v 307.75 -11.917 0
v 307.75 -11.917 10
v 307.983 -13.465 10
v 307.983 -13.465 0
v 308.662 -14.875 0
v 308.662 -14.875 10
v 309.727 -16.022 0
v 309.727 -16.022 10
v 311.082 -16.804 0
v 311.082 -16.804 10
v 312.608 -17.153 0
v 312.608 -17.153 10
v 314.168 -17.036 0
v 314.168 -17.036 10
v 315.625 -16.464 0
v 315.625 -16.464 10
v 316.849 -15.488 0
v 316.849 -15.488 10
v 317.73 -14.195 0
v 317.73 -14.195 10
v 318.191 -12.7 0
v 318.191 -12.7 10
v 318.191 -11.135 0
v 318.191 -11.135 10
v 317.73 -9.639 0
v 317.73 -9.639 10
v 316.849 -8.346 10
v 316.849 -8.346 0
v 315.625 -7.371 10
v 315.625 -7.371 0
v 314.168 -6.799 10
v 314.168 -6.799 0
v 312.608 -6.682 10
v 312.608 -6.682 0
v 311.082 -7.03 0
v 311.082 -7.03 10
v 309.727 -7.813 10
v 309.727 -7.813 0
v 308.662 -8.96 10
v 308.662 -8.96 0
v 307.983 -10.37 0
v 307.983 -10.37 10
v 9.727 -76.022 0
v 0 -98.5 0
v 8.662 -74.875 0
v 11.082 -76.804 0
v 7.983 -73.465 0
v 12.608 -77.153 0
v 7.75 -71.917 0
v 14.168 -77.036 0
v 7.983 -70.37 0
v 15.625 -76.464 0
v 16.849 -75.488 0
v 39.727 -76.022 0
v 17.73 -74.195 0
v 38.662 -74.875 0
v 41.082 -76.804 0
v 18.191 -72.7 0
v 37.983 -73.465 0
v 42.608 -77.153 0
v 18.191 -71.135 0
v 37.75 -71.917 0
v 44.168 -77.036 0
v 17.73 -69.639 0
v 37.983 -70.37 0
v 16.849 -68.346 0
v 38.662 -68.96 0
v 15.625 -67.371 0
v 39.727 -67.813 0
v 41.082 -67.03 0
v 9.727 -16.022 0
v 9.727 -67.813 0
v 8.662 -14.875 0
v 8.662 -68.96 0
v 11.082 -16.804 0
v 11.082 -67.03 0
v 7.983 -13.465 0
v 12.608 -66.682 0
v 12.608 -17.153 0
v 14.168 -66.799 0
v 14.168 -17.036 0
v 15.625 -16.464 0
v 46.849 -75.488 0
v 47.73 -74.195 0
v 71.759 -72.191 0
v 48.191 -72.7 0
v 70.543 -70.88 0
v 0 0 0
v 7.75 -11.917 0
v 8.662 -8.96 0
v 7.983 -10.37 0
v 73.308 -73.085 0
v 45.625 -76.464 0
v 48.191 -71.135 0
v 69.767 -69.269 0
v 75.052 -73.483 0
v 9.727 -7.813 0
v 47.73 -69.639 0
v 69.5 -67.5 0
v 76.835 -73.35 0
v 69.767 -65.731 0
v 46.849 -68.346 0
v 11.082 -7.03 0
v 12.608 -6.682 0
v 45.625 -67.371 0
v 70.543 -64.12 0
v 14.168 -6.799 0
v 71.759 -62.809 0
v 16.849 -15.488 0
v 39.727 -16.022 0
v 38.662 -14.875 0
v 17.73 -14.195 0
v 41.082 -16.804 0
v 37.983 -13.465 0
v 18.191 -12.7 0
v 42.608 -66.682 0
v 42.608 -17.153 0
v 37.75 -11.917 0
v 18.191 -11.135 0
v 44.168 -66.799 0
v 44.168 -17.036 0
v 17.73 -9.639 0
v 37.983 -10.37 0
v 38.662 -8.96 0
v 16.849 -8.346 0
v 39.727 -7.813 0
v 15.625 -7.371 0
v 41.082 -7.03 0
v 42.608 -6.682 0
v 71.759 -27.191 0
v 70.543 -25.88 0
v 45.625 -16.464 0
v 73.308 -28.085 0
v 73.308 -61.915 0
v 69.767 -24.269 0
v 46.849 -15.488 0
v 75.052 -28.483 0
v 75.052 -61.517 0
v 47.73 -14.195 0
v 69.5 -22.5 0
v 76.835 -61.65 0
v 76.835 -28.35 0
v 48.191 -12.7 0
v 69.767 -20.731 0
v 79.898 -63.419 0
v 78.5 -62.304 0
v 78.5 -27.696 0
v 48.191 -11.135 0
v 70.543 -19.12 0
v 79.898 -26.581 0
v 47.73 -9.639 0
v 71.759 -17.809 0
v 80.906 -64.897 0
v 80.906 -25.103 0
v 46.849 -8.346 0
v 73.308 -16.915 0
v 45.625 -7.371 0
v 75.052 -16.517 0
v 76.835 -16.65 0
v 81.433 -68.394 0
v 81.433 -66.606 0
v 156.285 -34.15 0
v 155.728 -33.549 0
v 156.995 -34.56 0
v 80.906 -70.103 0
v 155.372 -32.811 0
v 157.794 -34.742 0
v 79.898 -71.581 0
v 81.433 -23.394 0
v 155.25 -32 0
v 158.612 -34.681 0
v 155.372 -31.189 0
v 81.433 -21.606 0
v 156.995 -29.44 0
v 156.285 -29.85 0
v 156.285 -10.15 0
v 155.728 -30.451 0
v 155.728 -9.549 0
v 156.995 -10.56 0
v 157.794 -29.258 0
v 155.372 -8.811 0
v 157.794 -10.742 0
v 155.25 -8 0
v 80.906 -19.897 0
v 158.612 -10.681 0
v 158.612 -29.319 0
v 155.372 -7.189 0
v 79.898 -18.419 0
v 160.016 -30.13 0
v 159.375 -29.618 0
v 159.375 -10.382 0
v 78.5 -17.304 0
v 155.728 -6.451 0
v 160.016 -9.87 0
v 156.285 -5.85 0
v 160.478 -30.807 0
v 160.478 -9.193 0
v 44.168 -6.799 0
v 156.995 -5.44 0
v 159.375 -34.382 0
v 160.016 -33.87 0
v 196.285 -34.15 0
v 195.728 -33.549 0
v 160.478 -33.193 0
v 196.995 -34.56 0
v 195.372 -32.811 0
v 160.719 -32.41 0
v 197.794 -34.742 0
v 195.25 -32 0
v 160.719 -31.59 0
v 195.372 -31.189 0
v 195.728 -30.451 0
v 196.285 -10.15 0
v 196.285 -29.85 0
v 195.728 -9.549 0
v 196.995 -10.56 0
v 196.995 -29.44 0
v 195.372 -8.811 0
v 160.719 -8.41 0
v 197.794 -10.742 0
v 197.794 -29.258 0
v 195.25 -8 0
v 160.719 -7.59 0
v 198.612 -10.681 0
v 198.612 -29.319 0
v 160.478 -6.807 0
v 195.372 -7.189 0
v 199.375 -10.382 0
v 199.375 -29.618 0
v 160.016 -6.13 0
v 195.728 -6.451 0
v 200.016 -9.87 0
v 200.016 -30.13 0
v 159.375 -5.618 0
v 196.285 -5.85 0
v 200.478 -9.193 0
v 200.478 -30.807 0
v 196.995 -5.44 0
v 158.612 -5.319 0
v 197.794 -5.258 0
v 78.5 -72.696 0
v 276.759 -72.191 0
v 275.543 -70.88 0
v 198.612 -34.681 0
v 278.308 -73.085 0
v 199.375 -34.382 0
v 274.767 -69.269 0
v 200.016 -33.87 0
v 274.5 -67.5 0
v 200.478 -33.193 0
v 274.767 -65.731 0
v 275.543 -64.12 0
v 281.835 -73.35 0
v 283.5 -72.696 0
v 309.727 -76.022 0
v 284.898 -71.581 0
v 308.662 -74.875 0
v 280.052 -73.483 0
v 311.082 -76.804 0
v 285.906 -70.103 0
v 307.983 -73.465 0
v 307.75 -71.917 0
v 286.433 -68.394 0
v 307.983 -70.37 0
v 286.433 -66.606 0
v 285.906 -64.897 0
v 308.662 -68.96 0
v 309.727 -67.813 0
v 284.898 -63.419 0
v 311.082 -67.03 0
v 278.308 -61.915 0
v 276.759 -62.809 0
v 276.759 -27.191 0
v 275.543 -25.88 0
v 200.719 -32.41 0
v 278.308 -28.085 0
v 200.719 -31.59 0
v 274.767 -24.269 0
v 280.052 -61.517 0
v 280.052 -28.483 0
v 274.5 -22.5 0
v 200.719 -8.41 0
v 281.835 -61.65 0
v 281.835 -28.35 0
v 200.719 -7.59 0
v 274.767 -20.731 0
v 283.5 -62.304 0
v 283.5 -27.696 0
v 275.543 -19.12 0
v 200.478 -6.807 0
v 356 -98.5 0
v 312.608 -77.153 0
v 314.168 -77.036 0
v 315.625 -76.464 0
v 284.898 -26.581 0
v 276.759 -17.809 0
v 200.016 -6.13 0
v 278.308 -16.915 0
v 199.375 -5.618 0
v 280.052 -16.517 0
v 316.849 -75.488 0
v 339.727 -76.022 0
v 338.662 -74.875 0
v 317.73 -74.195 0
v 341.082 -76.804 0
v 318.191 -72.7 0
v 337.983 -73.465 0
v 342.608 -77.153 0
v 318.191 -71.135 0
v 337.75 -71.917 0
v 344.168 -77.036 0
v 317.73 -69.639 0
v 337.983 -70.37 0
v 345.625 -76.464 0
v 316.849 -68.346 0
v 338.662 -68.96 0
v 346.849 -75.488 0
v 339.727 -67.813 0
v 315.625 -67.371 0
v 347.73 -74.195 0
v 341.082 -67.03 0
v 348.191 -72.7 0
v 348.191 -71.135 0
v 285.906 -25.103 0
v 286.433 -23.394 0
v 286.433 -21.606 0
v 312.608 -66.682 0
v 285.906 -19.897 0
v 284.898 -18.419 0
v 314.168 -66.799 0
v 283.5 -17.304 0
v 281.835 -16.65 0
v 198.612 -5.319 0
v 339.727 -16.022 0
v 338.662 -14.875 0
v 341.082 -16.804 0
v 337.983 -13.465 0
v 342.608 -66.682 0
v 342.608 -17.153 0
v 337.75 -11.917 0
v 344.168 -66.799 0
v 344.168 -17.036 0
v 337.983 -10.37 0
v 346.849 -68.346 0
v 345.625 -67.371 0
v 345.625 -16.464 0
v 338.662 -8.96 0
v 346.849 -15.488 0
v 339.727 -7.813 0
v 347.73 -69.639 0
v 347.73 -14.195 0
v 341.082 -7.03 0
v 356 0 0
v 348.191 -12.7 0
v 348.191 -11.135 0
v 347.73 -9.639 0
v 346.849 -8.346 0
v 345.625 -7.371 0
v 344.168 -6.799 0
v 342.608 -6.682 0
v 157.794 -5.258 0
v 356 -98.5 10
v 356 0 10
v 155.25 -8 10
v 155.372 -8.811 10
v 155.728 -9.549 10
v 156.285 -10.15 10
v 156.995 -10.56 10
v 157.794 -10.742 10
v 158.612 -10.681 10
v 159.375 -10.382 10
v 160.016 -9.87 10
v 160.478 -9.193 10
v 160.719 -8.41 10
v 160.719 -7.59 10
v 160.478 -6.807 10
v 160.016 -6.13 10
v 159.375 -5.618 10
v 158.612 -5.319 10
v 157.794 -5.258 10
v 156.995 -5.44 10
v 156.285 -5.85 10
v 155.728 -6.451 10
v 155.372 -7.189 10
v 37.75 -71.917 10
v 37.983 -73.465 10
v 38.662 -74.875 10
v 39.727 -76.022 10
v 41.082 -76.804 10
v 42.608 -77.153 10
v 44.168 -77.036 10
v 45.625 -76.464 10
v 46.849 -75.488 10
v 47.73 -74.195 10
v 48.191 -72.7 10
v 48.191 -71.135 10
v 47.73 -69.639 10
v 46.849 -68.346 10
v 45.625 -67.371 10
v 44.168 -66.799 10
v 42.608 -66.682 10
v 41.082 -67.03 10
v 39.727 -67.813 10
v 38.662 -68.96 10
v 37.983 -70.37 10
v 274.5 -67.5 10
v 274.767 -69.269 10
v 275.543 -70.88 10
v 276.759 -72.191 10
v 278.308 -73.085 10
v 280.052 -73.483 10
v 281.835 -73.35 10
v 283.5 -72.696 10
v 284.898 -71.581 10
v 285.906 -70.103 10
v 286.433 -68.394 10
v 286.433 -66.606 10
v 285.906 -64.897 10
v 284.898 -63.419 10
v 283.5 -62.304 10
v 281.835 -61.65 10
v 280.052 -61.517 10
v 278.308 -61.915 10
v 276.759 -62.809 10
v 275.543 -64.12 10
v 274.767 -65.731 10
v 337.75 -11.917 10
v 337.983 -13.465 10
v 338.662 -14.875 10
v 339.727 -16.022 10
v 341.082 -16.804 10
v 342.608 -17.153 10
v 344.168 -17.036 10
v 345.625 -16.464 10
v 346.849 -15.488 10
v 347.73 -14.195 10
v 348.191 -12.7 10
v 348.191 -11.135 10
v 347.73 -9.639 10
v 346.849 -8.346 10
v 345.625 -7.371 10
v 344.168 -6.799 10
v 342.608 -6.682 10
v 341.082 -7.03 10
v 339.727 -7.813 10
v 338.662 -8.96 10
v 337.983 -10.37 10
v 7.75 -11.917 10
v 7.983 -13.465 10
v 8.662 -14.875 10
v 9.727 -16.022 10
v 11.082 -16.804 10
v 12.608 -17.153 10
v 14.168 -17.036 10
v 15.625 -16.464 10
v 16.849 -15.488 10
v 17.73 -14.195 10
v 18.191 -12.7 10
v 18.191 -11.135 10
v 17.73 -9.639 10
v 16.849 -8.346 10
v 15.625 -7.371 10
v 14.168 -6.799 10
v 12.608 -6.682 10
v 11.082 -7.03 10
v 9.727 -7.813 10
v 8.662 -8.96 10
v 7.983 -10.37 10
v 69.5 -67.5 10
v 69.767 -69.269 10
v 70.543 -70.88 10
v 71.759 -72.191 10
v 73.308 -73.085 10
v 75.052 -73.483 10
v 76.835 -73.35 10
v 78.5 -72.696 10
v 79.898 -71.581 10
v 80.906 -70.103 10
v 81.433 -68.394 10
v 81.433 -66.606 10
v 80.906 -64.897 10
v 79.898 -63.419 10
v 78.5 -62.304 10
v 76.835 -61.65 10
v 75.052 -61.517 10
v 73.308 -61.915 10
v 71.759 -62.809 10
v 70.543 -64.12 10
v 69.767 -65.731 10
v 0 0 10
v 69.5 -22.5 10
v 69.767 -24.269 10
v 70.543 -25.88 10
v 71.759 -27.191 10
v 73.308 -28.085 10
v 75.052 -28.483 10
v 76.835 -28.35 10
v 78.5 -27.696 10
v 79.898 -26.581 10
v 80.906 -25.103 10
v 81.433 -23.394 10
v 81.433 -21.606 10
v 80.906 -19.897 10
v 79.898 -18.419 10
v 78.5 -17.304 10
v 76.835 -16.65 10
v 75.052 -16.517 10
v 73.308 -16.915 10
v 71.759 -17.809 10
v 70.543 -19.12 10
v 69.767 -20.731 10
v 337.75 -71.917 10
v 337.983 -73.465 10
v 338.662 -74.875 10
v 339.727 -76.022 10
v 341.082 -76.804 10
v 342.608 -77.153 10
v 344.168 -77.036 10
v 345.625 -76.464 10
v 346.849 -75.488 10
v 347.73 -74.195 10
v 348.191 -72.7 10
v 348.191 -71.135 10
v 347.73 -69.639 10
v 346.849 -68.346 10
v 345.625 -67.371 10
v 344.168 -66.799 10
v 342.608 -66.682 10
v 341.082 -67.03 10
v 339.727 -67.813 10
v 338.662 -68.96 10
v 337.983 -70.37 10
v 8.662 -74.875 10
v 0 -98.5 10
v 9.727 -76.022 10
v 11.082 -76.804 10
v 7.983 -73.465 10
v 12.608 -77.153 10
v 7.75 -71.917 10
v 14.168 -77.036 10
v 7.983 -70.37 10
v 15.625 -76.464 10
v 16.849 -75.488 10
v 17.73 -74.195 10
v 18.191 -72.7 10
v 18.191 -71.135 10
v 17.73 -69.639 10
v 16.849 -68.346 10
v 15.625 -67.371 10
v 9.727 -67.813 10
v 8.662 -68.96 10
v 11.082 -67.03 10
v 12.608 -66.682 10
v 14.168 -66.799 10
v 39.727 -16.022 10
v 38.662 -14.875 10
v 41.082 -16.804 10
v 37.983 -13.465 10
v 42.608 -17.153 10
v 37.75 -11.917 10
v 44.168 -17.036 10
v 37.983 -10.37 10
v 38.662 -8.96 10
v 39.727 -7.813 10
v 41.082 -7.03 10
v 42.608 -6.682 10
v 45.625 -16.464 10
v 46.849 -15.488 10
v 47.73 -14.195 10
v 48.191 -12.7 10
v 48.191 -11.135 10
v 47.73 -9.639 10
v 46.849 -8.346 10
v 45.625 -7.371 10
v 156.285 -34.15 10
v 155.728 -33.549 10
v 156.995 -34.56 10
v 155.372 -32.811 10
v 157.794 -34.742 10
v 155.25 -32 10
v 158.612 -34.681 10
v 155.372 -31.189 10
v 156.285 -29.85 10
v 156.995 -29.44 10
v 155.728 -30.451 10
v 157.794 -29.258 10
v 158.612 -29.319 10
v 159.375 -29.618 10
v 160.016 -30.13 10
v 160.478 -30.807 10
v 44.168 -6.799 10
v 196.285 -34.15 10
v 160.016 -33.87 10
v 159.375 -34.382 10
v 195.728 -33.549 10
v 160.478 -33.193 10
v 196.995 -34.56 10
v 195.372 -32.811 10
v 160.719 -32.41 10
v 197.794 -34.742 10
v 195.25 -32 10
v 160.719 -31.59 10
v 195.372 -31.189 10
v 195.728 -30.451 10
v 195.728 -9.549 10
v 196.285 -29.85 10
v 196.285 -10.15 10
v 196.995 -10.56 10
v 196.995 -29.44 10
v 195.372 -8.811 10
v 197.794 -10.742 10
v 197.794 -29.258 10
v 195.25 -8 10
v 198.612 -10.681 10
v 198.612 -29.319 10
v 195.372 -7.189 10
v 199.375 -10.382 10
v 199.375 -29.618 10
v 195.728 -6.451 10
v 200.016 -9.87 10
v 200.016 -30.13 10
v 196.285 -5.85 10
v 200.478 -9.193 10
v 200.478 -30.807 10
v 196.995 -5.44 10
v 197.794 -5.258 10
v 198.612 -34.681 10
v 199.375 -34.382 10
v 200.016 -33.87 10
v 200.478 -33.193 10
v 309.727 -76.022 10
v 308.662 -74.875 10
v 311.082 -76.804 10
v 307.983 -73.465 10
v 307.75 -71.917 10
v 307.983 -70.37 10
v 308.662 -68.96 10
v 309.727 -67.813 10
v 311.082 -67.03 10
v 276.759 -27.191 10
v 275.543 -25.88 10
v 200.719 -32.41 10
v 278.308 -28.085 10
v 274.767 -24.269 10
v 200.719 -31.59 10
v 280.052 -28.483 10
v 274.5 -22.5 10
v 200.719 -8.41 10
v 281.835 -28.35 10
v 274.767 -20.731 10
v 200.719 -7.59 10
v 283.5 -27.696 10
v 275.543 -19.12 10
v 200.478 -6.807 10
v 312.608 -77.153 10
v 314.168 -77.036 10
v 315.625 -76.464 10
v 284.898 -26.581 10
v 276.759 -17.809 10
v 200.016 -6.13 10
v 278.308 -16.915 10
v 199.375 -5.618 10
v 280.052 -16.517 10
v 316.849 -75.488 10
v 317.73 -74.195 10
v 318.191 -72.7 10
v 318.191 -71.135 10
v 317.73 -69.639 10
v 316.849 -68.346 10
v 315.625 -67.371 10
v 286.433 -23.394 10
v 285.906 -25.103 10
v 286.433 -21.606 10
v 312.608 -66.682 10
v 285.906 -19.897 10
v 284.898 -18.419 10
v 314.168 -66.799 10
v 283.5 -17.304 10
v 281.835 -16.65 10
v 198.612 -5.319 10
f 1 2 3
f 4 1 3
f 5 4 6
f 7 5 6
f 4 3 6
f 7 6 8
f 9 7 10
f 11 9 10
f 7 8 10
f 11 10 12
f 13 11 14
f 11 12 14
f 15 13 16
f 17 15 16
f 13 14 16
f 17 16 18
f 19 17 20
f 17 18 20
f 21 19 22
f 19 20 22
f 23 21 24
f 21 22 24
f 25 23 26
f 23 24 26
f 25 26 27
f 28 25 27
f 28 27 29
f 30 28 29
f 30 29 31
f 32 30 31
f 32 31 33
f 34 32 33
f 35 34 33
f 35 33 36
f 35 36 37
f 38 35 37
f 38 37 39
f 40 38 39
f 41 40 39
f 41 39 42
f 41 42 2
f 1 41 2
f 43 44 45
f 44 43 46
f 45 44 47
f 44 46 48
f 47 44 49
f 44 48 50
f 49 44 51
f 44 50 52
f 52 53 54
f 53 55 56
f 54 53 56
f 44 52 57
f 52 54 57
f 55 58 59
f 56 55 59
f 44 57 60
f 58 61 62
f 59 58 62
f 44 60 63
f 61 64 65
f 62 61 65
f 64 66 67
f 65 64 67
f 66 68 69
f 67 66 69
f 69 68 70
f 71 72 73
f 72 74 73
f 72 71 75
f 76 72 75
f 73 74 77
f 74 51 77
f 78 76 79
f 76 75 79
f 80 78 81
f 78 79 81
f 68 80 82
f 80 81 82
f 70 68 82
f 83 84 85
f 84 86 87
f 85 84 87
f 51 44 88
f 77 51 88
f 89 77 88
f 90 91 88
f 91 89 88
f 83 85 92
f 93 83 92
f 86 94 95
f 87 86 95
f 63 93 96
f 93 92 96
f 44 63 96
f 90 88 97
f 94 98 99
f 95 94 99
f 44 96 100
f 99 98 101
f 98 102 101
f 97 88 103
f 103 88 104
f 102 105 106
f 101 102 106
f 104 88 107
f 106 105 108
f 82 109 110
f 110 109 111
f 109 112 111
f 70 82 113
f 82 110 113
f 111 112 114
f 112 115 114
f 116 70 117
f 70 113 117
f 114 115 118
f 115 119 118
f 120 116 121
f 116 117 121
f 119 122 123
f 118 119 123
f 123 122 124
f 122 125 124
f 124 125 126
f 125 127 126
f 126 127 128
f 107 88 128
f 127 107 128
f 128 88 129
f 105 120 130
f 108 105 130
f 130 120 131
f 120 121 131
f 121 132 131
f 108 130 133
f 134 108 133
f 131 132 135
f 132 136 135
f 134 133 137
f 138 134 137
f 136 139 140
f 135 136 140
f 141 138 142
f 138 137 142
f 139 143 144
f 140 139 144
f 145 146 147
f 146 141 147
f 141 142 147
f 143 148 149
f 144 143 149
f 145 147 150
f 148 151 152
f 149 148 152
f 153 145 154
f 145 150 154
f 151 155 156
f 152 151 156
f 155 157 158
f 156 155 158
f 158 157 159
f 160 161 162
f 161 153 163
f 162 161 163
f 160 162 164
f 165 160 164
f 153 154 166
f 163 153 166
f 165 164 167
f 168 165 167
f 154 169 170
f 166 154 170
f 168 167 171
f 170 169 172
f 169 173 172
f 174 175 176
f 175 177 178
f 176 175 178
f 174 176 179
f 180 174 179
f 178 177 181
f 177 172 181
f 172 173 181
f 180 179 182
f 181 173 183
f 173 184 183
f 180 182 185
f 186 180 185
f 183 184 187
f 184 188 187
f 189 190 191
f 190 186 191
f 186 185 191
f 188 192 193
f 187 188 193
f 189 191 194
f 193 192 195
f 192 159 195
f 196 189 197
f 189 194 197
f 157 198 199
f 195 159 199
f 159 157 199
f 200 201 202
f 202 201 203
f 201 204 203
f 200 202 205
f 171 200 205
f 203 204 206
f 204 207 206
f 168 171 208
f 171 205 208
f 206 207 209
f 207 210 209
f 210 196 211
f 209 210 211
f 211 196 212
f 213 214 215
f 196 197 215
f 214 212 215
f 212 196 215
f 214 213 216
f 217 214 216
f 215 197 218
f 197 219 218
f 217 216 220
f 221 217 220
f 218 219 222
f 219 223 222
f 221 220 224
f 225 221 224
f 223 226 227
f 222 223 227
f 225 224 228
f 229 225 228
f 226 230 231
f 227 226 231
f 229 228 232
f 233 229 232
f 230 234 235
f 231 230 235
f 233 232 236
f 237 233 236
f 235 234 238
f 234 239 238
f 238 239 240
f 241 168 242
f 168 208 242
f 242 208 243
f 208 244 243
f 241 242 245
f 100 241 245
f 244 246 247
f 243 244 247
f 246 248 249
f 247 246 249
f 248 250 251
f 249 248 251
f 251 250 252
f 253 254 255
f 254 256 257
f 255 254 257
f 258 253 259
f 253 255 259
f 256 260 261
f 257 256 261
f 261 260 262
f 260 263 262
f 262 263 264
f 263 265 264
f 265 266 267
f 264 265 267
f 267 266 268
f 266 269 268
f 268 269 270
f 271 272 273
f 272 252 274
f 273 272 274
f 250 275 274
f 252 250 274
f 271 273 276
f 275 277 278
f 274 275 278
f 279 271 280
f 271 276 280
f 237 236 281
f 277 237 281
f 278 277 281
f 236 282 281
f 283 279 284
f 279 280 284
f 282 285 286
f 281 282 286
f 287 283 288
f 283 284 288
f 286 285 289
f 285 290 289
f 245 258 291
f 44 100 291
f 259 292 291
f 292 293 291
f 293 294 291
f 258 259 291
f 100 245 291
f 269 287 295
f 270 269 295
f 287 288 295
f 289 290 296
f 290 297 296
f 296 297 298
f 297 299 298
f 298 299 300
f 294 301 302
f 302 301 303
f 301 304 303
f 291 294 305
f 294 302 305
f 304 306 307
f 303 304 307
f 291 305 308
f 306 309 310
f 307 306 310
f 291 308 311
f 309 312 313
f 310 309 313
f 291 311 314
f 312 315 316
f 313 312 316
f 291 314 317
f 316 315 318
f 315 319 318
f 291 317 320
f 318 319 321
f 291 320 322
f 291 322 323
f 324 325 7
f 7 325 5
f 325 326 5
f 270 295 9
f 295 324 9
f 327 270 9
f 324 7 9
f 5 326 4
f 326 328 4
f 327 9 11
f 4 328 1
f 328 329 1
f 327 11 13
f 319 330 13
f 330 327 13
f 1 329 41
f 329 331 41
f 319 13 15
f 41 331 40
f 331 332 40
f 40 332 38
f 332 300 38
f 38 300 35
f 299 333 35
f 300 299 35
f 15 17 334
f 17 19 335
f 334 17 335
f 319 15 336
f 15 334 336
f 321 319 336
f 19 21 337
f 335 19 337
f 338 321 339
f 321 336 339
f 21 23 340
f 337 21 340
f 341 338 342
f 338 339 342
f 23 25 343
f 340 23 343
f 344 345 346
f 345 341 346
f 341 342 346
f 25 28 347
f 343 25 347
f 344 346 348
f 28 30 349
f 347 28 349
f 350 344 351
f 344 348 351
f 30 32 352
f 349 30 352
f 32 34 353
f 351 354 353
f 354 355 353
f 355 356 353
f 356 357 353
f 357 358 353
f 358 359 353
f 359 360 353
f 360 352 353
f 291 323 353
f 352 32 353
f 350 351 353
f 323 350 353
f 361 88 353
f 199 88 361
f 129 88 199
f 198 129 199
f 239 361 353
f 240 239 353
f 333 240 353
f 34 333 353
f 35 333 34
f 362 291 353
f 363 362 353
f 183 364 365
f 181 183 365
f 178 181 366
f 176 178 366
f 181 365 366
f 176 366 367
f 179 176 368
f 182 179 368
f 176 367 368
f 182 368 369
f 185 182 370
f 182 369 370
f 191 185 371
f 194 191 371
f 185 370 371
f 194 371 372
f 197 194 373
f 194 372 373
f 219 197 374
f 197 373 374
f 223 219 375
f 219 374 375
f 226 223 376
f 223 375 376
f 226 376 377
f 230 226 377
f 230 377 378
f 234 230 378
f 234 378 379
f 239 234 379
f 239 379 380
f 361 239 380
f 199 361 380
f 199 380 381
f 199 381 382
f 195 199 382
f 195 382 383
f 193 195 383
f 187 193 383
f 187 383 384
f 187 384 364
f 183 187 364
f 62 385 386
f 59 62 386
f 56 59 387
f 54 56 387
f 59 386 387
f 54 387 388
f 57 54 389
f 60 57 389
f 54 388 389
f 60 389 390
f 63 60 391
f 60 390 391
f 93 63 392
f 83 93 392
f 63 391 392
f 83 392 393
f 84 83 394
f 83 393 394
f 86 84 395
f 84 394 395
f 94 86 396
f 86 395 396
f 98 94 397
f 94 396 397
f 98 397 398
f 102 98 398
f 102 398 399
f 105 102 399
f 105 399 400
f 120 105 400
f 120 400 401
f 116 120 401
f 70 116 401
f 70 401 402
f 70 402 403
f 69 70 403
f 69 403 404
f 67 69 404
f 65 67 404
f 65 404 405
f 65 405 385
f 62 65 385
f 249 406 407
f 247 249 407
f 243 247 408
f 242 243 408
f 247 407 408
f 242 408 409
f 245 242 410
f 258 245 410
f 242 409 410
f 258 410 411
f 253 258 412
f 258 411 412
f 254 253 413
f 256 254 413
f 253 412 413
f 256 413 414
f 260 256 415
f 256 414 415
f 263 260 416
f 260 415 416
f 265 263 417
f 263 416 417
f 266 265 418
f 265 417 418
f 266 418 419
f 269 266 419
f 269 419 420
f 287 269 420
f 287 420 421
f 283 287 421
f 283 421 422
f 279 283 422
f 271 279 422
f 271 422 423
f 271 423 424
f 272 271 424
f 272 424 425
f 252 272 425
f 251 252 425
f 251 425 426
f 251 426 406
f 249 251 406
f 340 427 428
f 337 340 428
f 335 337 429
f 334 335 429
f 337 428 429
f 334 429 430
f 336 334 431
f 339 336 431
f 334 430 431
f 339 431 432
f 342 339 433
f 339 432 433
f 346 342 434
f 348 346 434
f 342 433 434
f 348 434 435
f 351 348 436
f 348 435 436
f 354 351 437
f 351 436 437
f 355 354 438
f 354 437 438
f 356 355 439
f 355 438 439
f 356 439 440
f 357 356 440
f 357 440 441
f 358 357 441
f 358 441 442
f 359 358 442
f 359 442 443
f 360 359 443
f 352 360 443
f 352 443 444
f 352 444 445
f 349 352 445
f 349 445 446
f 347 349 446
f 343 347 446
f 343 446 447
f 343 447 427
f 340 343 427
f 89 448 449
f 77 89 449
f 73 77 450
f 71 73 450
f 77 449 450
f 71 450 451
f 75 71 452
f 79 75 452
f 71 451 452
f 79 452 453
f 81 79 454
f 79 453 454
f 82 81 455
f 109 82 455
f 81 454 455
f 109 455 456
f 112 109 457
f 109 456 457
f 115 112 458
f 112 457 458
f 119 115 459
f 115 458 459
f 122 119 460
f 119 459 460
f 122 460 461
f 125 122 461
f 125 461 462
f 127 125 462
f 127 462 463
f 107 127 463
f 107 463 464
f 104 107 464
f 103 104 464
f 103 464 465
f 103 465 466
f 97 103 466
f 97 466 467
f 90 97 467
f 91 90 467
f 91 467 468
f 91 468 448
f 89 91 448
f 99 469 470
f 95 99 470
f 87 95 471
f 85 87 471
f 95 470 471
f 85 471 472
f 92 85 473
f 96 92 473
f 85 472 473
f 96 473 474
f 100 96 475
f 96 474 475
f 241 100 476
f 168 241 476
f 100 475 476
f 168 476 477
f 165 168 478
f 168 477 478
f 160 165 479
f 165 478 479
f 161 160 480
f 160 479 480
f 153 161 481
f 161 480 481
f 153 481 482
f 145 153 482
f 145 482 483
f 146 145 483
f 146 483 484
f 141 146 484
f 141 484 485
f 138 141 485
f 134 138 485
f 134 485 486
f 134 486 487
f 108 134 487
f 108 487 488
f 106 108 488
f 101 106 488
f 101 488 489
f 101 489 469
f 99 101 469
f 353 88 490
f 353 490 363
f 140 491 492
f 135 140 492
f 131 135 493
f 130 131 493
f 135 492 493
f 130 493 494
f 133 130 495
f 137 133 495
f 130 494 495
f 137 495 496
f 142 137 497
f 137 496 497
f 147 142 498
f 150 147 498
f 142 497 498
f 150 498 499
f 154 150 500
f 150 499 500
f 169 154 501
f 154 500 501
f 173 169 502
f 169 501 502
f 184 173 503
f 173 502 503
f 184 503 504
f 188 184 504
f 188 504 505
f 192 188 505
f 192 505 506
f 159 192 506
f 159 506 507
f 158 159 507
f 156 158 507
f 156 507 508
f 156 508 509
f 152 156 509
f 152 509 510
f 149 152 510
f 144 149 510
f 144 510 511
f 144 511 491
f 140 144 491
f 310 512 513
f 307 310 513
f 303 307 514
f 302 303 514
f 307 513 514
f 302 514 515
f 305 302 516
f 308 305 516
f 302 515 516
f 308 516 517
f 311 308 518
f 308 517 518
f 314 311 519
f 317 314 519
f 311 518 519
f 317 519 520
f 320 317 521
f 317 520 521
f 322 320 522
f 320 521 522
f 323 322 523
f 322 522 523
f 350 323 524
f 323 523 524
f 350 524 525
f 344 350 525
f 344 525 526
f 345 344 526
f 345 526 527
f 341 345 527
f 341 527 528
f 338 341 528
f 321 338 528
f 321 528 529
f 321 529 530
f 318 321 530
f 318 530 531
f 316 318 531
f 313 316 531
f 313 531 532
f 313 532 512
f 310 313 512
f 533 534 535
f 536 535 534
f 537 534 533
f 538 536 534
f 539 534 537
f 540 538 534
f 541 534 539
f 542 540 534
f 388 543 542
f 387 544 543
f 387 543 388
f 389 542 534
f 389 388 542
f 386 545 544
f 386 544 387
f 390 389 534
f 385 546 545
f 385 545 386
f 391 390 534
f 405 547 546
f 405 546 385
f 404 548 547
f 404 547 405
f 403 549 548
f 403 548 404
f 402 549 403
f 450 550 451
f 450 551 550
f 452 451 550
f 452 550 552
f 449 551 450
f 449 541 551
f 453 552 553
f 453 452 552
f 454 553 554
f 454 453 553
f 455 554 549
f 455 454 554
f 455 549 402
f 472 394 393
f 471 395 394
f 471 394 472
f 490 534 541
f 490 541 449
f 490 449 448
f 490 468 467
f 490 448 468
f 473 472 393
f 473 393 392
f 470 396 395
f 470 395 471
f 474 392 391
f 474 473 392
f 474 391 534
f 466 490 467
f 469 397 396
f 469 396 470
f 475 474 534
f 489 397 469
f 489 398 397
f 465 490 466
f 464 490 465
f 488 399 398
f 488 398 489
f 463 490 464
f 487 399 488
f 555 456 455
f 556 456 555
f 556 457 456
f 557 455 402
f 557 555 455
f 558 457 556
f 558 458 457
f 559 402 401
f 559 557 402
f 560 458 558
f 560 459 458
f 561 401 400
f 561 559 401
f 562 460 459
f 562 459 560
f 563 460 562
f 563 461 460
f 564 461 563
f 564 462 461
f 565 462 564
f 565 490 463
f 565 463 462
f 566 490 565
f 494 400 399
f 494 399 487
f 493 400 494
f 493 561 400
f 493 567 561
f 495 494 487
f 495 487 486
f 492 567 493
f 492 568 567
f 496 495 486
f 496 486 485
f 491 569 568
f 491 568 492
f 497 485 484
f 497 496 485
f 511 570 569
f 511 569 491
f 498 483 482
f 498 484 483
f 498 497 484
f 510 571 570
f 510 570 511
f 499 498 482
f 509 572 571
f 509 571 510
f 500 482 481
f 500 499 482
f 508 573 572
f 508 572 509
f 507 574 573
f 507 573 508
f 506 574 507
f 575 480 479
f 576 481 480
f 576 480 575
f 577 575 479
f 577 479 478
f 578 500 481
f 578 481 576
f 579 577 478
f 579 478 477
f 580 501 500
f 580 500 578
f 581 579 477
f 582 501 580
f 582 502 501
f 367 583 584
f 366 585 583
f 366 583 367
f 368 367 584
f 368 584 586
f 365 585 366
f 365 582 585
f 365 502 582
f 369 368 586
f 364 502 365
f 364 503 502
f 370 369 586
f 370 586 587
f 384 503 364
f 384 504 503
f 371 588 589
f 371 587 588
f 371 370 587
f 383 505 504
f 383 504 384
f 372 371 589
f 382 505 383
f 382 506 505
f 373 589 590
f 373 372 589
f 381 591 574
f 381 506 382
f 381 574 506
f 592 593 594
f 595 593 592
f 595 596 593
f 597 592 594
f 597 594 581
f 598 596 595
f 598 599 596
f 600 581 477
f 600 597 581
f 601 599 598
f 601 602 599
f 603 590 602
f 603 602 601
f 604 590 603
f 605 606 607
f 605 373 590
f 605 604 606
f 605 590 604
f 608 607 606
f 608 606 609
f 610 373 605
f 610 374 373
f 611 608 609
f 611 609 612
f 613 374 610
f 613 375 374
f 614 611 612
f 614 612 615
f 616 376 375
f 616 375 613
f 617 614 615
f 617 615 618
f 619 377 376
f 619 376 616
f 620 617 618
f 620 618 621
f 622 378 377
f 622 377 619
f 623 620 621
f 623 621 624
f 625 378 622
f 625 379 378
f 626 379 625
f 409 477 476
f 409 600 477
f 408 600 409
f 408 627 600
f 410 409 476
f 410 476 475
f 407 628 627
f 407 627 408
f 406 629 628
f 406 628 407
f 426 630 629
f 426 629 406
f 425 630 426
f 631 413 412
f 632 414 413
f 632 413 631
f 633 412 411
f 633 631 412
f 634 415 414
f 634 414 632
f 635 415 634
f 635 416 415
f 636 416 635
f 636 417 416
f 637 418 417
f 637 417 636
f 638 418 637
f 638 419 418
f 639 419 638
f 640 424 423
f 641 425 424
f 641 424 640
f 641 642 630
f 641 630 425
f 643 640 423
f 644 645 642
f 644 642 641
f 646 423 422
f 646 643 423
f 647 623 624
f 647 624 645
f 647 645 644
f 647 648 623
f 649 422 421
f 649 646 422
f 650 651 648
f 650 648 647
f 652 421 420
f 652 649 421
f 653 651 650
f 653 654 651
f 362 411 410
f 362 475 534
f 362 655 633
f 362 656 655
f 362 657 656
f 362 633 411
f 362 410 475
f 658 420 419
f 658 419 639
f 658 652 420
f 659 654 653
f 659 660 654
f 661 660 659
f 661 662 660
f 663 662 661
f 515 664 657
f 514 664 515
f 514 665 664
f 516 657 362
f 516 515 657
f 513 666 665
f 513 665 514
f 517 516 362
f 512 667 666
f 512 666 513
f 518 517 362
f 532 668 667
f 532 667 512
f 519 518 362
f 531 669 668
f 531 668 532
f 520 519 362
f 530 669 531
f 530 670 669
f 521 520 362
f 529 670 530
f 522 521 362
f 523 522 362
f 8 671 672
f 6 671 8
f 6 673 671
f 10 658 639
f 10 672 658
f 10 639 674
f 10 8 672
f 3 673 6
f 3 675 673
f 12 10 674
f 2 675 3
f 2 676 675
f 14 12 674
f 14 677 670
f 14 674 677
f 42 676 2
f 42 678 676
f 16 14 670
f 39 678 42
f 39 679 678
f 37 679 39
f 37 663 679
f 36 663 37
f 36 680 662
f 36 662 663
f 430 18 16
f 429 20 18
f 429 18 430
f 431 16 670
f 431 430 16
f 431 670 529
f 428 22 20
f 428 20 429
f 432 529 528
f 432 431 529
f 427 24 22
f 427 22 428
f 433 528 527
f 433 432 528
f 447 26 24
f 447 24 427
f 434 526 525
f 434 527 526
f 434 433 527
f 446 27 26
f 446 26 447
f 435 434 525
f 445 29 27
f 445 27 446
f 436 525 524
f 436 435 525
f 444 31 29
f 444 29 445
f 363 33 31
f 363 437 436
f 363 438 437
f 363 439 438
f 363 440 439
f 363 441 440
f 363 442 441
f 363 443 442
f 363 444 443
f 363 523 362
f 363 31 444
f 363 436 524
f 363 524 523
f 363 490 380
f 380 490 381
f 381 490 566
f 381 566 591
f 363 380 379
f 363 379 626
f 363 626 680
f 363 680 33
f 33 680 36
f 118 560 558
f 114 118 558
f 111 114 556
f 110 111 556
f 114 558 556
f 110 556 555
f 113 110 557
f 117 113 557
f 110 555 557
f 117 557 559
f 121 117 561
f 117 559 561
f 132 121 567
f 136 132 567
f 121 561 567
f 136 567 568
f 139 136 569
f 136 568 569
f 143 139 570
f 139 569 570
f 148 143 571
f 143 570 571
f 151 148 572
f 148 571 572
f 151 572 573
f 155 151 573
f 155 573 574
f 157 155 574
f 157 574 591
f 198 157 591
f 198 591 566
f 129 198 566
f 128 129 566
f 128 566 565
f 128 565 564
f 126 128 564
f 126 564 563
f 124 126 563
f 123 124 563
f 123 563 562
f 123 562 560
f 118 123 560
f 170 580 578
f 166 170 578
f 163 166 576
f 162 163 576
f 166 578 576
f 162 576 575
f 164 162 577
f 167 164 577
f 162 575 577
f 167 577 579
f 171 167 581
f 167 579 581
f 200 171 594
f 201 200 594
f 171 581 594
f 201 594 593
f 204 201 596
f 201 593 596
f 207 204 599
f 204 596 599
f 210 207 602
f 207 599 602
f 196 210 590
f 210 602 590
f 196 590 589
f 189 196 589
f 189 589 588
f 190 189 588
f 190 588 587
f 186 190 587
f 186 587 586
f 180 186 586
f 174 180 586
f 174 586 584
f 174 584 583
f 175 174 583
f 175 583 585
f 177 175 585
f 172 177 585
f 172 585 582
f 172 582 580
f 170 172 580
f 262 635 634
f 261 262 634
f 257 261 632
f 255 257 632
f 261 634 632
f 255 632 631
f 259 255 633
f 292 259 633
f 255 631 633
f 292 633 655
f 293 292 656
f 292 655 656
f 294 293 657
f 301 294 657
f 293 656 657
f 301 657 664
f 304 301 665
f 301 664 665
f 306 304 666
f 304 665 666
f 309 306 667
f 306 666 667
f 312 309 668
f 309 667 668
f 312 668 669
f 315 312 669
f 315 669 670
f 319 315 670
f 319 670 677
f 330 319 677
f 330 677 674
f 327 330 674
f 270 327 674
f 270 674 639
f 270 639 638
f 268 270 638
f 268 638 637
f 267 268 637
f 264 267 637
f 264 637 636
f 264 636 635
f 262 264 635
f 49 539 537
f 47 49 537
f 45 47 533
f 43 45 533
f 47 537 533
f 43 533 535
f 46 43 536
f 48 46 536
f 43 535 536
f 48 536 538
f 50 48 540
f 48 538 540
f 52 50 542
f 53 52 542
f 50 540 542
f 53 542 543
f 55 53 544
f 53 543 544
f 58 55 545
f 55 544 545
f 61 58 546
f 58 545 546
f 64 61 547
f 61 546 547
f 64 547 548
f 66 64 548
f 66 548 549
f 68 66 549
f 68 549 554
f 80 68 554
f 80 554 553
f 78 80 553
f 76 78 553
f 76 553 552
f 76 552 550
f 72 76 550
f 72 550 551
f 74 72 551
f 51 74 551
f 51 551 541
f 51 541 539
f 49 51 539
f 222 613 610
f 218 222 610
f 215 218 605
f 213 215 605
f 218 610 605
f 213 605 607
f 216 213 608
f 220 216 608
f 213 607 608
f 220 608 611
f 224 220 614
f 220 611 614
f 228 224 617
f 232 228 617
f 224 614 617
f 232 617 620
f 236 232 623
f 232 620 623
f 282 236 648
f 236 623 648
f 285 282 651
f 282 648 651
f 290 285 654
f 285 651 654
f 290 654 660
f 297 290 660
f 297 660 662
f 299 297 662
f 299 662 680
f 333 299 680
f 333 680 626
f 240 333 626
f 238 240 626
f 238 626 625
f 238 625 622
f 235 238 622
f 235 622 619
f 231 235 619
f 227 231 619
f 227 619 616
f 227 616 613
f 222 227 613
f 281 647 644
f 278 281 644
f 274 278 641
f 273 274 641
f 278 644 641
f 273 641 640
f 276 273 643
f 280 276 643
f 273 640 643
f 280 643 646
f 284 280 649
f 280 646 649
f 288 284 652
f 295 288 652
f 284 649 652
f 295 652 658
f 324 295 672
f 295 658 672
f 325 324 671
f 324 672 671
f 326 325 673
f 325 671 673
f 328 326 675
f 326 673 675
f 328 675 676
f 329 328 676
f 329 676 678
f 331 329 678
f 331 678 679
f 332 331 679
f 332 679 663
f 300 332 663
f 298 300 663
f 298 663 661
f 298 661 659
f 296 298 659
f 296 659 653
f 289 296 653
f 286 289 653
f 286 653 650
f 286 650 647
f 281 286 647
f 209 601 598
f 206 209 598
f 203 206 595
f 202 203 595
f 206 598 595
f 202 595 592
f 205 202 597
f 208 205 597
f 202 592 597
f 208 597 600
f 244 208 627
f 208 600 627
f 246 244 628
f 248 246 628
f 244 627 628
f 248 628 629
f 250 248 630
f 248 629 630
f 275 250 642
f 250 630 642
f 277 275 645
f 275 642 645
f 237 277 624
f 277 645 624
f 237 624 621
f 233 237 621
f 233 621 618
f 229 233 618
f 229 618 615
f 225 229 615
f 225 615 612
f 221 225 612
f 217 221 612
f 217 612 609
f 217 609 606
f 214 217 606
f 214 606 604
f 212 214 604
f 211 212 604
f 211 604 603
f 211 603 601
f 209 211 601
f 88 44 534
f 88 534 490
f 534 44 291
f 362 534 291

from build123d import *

# Parameters (mm, degrees)
F0_W     = 356
F0_H     = 98.5
F3_DEPTH = 10
F4_D     = 12
F5_D     = 10.5
F6_D     = 5.5


with BuildPart() as f3:
    # F0 (on Top) → F3 (new body)
    with BuildSketch(Plane.XY):
        with Locations((178, -49.25)):
            Rectangle(F0_W, F0_H)
    extrude(amount=F3_DEPTH)

    # F4 (through all)
    with Locations(Plane(origin=(0, 0, 0), x_dir=(1, 0, 0), z_dir=(0, 0, -1))):
        with Locations((75.5, 22.5), (75.5, 67.5), (280.5, 67.5), (280.5, 22.5)):
            Hole(F4_D / 2)

    # F5 (through all)
    with Locations(Plane(origin=(0, 0, 0), x_dir=(1, 0, 0), z_dir=(0, 0, -1))):
        with Locations((13, 11.9172791019), (43, 11.9172791019), (13, 71.9172791019), (43, 71.9172791019), (313, 11.9172791019), (343, 11.9172791019), (343, 71.9172791019), (313, 71.9172791019)):
            Hole(F5_D / 2)

    # F6 (through all)
    with Locations(Plane(origin=(0, 0, 0), x_dir=(1, 0, 0), z_dir=(0, 0, -1))):
        with Locations((158, 8), (198, 8), (158, 32), (198, 32)):
            Hole(F6_D / 2)


solid = f3.part
